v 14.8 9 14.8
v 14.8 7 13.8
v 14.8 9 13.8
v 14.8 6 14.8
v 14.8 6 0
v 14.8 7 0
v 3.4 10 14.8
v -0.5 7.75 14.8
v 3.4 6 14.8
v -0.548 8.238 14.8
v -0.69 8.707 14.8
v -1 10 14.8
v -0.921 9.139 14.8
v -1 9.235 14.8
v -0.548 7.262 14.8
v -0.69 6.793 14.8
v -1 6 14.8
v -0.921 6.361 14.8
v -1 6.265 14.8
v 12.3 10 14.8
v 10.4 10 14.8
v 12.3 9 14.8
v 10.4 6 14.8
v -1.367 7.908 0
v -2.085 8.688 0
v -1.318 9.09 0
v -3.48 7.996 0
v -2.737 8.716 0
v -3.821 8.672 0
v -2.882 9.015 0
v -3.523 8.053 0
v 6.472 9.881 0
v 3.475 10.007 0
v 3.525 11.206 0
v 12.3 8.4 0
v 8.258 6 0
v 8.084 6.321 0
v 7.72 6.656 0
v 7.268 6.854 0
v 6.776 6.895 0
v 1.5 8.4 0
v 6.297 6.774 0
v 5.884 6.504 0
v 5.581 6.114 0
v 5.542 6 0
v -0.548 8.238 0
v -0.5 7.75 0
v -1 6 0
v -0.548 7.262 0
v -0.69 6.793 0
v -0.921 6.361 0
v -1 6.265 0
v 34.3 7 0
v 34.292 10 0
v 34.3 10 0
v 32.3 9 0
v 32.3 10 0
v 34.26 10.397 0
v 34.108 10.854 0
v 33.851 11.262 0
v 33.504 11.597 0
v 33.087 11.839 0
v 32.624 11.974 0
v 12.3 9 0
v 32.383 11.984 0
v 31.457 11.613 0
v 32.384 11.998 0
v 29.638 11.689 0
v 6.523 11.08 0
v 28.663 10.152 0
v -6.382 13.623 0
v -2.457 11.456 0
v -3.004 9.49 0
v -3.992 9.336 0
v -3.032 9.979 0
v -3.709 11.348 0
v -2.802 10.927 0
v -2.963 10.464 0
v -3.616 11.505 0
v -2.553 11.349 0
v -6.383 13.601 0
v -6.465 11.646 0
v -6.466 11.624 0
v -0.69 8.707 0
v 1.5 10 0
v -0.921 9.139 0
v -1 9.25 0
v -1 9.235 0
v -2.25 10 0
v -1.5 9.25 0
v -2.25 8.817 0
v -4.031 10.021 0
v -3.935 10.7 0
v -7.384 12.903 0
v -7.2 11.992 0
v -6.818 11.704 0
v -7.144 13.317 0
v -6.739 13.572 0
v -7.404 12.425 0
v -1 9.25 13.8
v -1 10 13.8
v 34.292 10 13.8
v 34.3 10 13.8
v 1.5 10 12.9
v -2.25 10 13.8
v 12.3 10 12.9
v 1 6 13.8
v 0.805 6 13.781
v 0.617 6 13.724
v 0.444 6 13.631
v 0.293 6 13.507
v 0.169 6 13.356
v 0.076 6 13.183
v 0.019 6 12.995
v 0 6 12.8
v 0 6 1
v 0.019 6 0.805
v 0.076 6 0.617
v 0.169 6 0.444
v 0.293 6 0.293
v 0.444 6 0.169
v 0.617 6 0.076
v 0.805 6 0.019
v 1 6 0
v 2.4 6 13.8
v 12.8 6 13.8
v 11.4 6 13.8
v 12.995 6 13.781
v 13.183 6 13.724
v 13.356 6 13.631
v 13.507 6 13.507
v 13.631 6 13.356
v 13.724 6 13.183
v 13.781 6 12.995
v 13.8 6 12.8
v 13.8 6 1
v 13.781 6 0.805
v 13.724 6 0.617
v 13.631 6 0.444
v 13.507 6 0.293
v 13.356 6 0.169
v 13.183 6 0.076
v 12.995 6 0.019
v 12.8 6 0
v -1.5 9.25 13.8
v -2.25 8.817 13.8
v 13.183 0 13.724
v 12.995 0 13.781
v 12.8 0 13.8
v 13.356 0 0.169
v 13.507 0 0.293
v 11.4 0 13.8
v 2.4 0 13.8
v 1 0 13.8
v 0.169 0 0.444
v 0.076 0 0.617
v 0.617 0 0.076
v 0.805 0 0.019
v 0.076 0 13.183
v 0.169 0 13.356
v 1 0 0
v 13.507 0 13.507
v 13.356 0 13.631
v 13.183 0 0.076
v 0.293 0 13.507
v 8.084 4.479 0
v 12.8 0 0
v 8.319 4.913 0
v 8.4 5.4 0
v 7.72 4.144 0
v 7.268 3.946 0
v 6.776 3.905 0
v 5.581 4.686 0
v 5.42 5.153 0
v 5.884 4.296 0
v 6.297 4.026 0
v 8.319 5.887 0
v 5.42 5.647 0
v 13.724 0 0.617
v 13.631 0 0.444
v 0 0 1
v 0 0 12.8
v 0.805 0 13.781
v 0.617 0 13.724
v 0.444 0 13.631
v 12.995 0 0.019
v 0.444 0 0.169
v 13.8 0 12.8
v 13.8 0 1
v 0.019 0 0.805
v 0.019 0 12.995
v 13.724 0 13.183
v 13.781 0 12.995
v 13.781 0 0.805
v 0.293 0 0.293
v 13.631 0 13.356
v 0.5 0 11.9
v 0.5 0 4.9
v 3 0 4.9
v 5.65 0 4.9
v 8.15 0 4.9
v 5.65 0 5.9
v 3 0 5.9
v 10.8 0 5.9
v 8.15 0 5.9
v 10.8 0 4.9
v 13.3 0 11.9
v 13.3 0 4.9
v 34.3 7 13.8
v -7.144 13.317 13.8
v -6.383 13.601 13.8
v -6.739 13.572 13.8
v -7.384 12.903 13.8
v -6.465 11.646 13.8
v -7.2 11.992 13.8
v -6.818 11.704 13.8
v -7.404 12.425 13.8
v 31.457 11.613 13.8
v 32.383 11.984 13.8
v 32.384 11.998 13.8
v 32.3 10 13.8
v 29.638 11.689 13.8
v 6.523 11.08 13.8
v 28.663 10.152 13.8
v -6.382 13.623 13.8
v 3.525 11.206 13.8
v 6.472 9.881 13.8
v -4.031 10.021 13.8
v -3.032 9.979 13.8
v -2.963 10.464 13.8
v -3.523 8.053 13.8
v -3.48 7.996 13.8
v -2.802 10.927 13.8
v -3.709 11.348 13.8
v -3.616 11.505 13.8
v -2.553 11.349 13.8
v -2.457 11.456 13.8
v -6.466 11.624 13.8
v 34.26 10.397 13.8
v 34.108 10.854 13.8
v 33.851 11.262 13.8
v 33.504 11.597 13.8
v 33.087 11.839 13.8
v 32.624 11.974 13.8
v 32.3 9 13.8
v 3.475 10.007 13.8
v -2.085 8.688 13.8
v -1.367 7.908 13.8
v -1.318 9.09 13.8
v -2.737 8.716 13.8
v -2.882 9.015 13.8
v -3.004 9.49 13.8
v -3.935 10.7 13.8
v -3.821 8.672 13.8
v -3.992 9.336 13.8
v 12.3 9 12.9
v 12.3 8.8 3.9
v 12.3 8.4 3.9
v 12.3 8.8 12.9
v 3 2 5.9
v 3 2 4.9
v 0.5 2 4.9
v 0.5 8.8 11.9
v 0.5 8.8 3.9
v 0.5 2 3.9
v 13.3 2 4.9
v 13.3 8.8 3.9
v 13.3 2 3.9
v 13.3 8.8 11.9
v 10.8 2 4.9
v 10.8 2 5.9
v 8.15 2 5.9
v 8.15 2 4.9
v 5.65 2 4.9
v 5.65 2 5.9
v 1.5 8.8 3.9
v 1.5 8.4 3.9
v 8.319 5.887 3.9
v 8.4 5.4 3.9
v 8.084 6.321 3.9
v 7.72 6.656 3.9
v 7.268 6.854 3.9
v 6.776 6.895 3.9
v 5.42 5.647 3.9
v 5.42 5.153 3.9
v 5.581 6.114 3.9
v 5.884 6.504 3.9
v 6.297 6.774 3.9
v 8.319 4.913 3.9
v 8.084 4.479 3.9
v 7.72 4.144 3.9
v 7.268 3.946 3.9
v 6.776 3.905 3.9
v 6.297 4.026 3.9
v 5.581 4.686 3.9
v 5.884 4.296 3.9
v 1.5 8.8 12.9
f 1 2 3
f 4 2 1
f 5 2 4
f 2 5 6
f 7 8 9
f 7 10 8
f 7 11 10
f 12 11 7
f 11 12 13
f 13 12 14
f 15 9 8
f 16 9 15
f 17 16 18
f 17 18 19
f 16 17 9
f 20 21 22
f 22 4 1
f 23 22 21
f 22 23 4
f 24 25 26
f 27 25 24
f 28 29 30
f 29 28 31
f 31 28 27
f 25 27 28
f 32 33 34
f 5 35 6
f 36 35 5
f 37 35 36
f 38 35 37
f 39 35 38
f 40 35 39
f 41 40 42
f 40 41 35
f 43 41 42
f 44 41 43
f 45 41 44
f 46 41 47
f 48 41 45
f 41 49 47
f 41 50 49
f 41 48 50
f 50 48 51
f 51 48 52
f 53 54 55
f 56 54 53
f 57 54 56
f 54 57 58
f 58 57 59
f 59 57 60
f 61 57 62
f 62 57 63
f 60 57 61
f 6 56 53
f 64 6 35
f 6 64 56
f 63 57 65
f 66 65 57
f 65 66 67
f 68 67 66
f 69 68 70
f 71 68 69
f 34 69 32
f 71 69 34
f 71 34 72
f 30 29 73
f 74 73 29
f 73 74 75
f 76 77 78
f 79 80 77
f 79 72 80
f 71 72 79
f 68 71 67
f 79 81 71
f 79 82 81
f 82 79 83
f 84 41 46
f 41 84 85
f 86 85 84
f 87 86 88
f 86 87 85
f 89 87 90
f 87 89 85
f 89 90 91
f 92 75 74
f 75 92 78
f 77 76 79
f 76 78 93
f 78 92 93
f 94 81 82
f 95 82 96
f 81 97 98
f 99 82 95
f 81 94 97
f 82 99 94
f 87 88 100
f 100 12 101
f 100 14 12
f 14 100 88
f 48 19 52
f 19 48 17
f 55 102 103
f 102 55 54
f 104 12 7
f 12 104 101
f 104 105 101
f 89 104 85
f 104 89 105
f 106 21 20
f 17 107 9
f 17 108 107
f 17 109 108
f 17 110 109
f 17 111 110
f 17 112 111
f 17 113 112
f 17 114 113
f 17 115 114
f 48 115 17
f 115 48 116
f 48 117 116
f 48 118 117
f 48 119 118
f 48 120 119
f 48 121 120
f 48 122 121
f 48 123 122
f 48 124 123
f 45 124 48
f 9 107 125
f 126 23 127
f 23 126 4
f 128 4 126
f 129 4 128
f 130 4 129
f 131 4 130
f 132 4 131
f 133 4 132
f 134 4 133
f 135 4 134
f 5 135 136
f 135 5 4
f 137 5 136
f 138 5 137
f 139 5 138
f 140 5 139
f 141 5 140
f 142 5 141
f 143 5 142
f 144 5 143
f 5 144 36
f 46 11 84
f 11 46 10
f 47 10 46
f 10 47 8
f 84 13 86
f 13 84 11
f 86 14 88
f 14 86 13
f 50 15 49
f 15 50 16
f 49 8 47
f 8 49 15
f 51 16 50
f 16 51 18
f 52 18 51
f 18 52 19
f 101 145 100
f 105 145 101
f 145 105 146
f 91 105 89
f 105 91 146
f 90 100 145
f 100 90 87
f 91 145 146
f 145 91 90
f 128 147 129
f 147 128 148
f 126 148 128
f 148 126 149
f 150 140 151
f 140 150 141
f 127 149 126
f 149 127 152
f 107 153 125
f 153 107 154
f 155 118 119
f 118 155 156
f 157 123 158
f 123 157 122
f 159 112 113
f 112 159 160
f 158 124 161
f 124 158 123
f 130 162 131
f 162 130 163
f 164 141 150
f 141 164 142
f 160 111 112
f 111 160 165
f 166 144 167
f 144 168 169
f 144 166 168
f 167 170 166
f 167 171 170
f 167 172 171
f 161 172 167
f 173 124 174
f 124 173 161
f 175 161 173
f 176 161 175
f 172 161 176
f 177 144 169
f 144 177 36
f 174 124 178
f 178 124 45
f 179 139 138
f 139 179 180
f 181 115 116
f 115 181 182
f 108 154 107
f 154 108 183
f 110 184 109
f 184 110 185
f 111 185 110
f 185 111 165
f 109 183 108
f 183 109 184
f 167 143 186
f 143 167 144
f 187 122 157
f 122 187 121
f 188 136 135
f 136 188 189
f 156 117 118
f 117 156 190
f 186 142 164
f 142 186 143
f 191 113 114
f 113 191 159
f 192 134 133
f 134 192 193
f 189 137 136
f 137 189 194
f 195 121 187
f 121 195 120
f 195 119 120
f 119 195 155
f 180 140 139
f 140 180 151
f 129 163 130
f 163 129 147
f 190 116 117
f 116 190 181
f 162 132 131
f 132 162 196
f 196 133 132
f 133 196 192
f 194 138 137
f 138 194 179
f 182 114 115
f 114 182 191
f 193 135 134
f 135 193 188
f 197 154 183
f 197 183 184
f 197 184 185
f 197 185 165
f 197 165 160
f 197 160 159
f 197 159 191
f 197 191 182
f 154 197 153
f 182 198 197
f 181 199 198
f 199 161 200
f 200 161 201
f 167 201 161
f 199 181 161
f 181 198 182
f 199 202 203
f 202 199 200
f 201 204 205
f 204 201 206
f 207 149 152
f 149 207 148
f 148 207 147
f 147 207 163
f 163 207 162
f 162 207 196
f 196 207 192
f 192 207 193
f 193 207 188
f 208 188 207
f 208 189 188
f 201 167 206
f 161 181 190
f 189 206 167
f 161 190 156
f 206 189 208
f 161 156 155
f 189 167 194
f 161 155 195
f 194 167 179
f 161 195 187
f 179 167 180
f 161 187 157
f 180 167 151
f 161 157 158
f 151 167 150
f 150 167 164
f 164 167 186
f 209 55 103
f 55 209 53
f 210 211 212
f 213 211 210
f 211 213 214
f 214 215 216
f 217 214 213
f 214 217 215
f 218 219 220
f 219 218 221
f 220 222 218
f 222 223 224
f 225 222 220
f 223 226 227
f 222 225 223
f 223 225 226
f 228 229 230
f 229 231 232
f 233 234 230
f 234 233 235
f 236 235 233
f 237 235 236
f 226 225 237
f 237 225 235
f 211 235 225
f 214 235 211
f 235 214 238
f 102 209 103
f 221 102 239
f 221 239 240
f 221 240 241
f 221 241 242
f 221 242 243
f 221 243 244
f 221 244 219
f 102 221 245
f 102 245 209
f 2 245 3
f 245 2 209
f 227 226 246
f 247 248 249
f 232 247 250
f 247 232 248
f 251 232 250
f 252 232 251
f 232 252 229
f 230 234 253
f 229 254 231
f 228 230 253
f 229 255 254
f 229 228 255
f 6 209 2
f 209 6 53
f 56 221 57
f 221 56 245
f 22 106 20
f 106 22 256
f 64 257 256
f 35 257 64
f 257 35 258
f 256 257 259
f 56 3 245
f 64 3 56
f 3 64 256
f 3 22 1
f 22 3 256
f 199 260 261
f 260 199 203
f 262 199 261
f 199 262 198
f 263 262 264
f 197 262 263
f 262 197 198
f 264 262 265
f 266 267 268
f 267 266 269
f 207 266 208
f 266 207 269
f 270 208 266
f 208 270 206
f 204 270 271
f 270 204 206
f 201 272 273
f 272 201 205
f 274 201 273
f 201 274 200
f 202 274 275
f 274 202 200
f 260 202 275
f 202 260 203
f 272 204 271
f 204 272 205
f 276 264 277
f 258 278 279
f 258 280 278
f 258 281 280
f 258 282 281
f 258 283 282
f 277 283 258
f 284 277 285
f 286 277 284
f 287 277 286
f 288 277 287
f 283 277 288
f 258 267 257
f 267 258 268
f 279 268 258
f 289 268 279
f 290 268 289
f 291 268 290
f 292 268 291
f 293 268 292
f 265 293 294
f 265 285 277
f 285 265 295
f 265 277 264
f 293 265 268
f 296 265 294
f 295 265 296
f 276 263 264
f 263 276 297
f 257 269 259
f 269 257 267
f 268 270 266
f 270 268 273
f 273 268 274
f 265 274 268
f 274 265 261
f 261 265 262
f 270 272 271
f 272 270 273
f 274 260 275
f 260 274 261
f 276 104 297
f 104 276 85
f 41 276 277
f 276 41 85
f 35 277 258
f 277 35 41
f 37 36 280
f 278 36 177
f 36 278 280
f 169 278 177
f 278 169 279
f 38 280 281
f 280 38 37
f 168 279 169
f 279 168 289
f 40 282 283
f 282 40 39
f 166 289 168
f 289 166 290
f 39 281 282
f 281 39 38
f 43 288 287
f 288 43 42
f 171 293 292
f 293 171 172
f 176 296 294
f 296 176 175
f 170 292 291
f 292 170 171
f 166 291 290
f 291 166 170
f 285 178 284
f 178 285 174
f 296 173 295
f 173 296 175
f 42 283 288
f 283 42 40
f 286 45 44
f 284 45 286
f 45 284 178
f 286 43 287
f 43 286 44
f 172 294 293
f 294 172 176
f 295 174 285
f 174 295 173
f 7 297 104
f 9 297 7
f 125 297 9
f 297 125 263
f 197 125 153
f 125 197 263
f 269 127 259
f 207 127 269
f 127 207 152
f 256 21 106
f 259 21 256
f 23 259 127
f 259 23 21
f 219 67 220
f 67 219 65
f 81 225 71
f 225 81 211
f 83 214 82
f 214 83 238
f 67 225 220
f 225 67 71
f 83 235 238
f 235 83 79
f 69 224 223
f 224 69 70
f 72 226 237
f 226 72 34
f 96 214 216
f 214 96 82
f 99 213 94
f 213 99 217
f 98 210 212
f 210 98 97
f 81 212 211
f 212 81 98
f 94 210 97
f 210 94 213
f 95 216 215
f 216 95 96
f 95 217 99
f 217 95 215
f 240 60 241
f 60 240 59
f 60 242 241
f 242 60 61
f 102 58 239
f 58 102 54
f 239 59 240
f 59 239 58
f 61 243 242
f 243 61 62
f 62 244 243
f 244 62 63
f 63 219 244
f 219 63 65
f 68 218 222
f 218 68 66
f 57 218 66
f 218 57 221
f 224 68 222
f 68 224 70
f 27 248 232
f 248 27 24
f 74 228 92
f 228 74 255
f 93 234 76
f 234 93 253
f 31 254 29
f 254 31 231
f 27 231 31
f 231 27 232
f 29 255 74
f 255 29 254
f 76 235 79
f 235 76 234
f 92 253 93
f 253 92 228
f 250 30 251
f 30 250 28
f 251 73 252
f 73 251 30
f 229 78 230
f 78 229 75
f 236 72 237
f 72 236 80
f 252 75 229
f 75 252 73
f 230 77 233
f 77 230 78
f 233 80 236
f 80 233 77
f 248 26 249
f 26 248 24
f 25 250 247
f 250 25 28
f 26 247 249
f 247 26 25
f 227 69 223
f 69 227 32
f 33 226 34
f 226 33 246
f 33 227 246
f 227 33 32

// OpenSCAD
use <../hardware/microswitch-cherry-mx.scad>

switch_carrier(5, 20);
